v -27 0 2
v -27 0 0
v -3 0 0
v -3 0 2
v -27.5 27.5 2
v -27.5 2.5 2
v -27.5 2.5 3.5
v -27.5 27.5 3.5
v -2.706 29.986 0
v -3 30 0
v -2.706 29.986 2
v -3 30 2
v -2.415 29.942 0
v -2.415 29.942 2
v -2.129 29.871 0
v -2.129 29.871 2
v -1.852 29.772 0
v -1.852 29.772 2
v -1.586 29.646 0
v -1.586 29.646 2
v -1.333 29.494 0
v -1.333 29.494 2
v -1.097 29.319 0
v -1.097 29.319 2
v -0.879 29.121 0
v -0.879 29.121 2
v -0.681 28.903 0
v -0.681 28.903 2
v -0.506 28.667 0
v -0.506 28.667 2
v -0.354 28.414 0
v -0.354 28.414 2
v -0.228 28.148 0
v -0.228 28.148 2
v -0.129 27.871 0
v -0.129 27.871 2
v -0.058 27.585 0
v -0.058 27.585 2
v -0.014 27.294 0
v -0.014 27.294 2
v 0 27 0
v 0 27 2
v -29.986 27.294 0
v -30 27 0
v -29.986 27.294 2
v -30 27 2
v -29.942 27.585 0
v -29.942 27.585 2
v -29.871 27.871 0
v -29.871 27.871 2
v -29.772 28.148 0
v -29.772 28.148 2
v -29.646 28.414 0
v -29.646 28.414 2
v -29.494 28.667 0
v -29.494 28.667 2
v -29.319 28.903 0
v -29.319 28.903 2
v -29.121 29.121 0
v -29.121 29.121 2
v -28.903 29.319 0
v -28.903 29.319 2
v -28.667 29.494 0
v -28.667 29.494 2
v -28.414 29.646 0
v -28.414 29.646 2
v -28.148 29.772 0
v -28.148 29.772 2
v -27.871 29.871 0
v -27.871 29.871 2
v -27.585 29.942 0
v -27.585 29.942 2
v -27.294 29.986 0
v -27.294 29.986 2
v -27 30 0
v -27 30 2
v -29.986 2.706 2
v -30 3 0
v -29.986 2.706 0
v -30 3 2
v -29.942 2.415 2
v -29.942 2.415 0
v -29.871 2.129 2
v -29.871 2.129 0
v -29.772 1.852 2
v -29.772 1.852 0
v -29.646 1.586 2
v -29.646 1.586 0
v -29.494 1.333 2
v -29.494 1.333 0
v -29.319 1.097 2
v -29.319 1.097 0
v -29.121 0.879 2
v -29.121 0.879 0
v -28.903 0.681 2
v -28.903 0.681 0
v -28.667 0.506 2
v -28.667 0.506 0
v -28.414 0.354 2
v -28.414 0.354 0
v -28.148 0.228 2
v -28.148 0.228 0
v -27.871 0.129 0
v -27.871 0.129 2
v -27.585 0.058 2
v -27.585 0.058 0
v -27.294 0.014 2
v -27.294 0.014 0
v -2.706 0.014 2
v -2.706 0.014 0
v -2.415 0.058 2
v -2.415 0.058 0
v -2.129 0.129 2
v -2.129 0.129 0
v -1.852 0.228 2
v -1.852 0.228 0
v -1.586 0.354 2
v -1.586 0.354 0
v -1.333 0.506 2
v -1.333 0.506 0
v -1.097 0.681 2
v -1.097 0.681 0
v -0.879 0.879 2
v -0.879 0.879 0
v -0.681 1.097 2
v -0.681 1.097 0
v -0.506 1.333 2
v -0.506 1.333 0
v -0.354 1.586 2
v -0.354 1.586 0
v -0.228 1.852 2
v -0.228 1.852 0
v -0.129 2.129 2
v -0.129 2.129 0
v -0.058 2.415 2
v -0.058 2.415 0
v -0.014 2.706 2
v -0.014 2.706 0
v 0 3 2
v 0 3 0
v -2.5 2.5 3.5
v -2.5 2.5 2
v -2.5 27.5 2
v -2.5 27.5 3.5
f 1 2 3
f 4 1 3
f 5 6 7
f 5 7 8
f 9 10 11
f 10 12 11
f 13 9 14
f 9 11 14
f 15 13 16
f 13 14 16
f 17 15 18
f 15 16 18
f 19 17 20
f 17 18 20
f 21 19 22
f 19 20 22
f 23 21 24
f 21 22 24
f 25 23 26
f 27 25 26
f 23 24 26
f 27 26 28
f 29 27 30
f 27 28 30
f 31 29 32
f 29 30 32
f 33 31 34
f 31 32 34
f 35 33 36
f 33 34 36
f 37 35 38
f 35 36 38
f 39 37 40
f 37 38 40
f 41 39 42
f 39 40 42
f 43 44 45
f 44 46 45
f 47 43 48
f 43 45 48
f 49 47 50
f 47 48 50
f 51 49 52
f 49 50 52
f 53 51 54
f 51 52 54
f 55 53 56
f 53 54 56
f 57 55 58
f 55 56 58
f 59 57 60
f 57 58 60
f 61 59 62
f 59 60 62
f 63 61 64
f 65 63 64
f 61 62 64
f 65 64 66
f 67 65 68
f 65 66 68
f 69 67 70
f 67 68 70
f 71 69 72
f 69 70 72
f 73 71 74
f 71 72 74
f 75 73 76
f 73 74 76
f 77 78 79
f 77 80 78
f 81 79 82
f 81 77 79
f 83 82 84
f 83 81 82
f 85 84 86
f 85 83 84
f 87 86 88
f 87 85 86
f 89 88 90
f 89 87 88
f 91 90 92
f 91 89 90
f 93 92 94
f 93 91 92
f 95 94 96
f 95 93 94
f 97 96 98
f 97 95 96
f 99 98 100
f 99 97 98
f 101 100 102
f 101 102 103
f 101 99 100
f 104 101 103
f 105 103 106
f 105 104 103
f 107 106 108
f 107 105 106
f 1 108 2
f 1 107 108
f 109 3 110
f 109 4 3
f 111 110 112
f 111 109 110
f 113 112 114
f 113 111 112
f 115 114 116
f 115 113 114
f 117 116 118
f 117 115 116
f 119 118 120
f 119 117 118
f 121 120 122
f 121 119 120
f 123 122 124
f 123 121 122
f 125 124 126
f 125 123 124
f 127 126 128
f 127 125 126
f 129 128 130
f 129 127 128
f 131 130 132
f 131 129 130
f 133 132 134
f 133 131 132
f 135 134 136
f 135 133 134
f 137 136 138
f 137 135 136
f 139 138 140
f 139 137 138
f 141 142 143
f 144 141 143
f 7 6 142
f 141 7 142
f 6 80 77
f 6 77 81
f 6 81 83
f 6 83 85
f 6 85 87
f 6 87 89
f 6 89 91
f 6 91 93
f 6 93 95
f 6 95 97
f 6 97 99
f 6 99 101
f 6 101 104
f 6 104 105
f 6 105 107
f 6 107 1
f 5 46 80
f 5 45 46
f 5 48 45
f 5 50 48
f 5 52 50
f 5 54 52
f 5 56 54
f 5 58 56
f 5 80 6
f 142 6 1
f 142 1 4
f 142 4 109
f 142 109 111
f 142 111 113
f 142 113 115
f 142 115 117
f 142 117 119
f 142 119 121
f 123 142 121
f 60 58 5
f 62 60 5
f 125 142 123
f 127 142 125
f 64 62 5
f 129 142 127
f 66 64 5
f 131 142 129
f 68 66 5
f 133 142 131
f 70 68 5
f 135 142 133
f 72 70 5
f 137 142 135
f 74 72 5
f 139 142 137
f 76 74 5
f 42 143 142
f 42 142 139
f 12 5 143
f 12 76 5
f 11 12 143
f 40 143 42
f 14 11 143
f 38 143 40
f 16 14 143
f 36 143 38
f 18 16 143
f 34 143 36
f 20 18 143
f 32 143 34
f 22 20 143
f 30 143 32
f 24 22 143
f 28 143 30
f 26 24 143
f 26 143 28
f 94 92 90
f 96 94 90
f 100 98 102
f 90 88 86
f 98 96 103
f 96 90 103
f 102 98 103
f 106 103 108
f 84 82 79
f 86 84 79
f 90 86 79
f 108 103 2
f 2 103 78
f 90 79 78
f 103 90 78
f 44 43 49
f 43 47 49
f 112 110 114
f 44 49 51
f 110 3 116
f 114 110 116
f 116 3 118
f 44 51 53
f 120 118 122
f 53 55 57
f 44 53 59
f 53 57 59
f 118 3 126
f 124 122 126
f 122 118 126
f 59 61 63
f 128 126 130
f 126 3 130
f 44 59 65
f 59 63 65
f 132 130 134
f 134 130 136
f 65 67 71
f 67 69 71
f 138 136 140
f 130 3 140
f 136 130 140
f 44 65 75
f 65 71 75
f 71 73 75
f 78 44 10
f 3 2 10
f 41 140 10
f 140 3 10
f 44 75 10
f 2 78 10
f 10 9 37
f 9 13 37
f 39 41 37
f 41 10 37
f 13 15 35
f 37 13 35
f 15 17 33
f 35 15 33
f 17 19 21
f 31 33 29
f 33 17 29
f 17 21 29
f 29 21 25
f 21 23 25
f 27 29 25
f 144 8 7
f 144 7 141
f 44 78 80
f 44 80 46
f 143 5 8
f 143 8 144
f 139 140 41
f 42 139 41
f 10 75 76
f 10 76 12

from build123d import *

# Parameters (mm, degrees)
SKETCH_W     = 30
SKETCH_H     = 30
PAD_DEPTH    = 2
SKETCH001_W  = 25
SKETCH001_H  = 25
PAD001_DEPTH = 1.5
FILLET_R     = 3


with BuildPart() as part:
    # Sketch → Pad (new body)
    with BuildSketch(Plane.XY):
        with Locations((-15, 15)):
            Rectangle(SKETCH_W, SKETCH_H)
    extrude(amount=PAD_DEPTH)

    # Sketch001 (on Face6 of Pad) → Pad001 (join)
    with BuildSketch(Plane.XY.offset(2)):
        with Locations((-15, 15)):
            Rectangle(SKETCH001_W, SKETCH001_H)
    extrude(amount=PAD001_DEPTH)

    # Fillet
    fillet_edges = [part.edges().sort_by_distance(p)[0] for p in [
        (-30, 0, 1),
        (0, 0, 1),
        (0, 30, 1),
        (-30, 30, 1),
    ]]
    fillet(fillet_edges, radius=FILLET_R)


solid = part.part
